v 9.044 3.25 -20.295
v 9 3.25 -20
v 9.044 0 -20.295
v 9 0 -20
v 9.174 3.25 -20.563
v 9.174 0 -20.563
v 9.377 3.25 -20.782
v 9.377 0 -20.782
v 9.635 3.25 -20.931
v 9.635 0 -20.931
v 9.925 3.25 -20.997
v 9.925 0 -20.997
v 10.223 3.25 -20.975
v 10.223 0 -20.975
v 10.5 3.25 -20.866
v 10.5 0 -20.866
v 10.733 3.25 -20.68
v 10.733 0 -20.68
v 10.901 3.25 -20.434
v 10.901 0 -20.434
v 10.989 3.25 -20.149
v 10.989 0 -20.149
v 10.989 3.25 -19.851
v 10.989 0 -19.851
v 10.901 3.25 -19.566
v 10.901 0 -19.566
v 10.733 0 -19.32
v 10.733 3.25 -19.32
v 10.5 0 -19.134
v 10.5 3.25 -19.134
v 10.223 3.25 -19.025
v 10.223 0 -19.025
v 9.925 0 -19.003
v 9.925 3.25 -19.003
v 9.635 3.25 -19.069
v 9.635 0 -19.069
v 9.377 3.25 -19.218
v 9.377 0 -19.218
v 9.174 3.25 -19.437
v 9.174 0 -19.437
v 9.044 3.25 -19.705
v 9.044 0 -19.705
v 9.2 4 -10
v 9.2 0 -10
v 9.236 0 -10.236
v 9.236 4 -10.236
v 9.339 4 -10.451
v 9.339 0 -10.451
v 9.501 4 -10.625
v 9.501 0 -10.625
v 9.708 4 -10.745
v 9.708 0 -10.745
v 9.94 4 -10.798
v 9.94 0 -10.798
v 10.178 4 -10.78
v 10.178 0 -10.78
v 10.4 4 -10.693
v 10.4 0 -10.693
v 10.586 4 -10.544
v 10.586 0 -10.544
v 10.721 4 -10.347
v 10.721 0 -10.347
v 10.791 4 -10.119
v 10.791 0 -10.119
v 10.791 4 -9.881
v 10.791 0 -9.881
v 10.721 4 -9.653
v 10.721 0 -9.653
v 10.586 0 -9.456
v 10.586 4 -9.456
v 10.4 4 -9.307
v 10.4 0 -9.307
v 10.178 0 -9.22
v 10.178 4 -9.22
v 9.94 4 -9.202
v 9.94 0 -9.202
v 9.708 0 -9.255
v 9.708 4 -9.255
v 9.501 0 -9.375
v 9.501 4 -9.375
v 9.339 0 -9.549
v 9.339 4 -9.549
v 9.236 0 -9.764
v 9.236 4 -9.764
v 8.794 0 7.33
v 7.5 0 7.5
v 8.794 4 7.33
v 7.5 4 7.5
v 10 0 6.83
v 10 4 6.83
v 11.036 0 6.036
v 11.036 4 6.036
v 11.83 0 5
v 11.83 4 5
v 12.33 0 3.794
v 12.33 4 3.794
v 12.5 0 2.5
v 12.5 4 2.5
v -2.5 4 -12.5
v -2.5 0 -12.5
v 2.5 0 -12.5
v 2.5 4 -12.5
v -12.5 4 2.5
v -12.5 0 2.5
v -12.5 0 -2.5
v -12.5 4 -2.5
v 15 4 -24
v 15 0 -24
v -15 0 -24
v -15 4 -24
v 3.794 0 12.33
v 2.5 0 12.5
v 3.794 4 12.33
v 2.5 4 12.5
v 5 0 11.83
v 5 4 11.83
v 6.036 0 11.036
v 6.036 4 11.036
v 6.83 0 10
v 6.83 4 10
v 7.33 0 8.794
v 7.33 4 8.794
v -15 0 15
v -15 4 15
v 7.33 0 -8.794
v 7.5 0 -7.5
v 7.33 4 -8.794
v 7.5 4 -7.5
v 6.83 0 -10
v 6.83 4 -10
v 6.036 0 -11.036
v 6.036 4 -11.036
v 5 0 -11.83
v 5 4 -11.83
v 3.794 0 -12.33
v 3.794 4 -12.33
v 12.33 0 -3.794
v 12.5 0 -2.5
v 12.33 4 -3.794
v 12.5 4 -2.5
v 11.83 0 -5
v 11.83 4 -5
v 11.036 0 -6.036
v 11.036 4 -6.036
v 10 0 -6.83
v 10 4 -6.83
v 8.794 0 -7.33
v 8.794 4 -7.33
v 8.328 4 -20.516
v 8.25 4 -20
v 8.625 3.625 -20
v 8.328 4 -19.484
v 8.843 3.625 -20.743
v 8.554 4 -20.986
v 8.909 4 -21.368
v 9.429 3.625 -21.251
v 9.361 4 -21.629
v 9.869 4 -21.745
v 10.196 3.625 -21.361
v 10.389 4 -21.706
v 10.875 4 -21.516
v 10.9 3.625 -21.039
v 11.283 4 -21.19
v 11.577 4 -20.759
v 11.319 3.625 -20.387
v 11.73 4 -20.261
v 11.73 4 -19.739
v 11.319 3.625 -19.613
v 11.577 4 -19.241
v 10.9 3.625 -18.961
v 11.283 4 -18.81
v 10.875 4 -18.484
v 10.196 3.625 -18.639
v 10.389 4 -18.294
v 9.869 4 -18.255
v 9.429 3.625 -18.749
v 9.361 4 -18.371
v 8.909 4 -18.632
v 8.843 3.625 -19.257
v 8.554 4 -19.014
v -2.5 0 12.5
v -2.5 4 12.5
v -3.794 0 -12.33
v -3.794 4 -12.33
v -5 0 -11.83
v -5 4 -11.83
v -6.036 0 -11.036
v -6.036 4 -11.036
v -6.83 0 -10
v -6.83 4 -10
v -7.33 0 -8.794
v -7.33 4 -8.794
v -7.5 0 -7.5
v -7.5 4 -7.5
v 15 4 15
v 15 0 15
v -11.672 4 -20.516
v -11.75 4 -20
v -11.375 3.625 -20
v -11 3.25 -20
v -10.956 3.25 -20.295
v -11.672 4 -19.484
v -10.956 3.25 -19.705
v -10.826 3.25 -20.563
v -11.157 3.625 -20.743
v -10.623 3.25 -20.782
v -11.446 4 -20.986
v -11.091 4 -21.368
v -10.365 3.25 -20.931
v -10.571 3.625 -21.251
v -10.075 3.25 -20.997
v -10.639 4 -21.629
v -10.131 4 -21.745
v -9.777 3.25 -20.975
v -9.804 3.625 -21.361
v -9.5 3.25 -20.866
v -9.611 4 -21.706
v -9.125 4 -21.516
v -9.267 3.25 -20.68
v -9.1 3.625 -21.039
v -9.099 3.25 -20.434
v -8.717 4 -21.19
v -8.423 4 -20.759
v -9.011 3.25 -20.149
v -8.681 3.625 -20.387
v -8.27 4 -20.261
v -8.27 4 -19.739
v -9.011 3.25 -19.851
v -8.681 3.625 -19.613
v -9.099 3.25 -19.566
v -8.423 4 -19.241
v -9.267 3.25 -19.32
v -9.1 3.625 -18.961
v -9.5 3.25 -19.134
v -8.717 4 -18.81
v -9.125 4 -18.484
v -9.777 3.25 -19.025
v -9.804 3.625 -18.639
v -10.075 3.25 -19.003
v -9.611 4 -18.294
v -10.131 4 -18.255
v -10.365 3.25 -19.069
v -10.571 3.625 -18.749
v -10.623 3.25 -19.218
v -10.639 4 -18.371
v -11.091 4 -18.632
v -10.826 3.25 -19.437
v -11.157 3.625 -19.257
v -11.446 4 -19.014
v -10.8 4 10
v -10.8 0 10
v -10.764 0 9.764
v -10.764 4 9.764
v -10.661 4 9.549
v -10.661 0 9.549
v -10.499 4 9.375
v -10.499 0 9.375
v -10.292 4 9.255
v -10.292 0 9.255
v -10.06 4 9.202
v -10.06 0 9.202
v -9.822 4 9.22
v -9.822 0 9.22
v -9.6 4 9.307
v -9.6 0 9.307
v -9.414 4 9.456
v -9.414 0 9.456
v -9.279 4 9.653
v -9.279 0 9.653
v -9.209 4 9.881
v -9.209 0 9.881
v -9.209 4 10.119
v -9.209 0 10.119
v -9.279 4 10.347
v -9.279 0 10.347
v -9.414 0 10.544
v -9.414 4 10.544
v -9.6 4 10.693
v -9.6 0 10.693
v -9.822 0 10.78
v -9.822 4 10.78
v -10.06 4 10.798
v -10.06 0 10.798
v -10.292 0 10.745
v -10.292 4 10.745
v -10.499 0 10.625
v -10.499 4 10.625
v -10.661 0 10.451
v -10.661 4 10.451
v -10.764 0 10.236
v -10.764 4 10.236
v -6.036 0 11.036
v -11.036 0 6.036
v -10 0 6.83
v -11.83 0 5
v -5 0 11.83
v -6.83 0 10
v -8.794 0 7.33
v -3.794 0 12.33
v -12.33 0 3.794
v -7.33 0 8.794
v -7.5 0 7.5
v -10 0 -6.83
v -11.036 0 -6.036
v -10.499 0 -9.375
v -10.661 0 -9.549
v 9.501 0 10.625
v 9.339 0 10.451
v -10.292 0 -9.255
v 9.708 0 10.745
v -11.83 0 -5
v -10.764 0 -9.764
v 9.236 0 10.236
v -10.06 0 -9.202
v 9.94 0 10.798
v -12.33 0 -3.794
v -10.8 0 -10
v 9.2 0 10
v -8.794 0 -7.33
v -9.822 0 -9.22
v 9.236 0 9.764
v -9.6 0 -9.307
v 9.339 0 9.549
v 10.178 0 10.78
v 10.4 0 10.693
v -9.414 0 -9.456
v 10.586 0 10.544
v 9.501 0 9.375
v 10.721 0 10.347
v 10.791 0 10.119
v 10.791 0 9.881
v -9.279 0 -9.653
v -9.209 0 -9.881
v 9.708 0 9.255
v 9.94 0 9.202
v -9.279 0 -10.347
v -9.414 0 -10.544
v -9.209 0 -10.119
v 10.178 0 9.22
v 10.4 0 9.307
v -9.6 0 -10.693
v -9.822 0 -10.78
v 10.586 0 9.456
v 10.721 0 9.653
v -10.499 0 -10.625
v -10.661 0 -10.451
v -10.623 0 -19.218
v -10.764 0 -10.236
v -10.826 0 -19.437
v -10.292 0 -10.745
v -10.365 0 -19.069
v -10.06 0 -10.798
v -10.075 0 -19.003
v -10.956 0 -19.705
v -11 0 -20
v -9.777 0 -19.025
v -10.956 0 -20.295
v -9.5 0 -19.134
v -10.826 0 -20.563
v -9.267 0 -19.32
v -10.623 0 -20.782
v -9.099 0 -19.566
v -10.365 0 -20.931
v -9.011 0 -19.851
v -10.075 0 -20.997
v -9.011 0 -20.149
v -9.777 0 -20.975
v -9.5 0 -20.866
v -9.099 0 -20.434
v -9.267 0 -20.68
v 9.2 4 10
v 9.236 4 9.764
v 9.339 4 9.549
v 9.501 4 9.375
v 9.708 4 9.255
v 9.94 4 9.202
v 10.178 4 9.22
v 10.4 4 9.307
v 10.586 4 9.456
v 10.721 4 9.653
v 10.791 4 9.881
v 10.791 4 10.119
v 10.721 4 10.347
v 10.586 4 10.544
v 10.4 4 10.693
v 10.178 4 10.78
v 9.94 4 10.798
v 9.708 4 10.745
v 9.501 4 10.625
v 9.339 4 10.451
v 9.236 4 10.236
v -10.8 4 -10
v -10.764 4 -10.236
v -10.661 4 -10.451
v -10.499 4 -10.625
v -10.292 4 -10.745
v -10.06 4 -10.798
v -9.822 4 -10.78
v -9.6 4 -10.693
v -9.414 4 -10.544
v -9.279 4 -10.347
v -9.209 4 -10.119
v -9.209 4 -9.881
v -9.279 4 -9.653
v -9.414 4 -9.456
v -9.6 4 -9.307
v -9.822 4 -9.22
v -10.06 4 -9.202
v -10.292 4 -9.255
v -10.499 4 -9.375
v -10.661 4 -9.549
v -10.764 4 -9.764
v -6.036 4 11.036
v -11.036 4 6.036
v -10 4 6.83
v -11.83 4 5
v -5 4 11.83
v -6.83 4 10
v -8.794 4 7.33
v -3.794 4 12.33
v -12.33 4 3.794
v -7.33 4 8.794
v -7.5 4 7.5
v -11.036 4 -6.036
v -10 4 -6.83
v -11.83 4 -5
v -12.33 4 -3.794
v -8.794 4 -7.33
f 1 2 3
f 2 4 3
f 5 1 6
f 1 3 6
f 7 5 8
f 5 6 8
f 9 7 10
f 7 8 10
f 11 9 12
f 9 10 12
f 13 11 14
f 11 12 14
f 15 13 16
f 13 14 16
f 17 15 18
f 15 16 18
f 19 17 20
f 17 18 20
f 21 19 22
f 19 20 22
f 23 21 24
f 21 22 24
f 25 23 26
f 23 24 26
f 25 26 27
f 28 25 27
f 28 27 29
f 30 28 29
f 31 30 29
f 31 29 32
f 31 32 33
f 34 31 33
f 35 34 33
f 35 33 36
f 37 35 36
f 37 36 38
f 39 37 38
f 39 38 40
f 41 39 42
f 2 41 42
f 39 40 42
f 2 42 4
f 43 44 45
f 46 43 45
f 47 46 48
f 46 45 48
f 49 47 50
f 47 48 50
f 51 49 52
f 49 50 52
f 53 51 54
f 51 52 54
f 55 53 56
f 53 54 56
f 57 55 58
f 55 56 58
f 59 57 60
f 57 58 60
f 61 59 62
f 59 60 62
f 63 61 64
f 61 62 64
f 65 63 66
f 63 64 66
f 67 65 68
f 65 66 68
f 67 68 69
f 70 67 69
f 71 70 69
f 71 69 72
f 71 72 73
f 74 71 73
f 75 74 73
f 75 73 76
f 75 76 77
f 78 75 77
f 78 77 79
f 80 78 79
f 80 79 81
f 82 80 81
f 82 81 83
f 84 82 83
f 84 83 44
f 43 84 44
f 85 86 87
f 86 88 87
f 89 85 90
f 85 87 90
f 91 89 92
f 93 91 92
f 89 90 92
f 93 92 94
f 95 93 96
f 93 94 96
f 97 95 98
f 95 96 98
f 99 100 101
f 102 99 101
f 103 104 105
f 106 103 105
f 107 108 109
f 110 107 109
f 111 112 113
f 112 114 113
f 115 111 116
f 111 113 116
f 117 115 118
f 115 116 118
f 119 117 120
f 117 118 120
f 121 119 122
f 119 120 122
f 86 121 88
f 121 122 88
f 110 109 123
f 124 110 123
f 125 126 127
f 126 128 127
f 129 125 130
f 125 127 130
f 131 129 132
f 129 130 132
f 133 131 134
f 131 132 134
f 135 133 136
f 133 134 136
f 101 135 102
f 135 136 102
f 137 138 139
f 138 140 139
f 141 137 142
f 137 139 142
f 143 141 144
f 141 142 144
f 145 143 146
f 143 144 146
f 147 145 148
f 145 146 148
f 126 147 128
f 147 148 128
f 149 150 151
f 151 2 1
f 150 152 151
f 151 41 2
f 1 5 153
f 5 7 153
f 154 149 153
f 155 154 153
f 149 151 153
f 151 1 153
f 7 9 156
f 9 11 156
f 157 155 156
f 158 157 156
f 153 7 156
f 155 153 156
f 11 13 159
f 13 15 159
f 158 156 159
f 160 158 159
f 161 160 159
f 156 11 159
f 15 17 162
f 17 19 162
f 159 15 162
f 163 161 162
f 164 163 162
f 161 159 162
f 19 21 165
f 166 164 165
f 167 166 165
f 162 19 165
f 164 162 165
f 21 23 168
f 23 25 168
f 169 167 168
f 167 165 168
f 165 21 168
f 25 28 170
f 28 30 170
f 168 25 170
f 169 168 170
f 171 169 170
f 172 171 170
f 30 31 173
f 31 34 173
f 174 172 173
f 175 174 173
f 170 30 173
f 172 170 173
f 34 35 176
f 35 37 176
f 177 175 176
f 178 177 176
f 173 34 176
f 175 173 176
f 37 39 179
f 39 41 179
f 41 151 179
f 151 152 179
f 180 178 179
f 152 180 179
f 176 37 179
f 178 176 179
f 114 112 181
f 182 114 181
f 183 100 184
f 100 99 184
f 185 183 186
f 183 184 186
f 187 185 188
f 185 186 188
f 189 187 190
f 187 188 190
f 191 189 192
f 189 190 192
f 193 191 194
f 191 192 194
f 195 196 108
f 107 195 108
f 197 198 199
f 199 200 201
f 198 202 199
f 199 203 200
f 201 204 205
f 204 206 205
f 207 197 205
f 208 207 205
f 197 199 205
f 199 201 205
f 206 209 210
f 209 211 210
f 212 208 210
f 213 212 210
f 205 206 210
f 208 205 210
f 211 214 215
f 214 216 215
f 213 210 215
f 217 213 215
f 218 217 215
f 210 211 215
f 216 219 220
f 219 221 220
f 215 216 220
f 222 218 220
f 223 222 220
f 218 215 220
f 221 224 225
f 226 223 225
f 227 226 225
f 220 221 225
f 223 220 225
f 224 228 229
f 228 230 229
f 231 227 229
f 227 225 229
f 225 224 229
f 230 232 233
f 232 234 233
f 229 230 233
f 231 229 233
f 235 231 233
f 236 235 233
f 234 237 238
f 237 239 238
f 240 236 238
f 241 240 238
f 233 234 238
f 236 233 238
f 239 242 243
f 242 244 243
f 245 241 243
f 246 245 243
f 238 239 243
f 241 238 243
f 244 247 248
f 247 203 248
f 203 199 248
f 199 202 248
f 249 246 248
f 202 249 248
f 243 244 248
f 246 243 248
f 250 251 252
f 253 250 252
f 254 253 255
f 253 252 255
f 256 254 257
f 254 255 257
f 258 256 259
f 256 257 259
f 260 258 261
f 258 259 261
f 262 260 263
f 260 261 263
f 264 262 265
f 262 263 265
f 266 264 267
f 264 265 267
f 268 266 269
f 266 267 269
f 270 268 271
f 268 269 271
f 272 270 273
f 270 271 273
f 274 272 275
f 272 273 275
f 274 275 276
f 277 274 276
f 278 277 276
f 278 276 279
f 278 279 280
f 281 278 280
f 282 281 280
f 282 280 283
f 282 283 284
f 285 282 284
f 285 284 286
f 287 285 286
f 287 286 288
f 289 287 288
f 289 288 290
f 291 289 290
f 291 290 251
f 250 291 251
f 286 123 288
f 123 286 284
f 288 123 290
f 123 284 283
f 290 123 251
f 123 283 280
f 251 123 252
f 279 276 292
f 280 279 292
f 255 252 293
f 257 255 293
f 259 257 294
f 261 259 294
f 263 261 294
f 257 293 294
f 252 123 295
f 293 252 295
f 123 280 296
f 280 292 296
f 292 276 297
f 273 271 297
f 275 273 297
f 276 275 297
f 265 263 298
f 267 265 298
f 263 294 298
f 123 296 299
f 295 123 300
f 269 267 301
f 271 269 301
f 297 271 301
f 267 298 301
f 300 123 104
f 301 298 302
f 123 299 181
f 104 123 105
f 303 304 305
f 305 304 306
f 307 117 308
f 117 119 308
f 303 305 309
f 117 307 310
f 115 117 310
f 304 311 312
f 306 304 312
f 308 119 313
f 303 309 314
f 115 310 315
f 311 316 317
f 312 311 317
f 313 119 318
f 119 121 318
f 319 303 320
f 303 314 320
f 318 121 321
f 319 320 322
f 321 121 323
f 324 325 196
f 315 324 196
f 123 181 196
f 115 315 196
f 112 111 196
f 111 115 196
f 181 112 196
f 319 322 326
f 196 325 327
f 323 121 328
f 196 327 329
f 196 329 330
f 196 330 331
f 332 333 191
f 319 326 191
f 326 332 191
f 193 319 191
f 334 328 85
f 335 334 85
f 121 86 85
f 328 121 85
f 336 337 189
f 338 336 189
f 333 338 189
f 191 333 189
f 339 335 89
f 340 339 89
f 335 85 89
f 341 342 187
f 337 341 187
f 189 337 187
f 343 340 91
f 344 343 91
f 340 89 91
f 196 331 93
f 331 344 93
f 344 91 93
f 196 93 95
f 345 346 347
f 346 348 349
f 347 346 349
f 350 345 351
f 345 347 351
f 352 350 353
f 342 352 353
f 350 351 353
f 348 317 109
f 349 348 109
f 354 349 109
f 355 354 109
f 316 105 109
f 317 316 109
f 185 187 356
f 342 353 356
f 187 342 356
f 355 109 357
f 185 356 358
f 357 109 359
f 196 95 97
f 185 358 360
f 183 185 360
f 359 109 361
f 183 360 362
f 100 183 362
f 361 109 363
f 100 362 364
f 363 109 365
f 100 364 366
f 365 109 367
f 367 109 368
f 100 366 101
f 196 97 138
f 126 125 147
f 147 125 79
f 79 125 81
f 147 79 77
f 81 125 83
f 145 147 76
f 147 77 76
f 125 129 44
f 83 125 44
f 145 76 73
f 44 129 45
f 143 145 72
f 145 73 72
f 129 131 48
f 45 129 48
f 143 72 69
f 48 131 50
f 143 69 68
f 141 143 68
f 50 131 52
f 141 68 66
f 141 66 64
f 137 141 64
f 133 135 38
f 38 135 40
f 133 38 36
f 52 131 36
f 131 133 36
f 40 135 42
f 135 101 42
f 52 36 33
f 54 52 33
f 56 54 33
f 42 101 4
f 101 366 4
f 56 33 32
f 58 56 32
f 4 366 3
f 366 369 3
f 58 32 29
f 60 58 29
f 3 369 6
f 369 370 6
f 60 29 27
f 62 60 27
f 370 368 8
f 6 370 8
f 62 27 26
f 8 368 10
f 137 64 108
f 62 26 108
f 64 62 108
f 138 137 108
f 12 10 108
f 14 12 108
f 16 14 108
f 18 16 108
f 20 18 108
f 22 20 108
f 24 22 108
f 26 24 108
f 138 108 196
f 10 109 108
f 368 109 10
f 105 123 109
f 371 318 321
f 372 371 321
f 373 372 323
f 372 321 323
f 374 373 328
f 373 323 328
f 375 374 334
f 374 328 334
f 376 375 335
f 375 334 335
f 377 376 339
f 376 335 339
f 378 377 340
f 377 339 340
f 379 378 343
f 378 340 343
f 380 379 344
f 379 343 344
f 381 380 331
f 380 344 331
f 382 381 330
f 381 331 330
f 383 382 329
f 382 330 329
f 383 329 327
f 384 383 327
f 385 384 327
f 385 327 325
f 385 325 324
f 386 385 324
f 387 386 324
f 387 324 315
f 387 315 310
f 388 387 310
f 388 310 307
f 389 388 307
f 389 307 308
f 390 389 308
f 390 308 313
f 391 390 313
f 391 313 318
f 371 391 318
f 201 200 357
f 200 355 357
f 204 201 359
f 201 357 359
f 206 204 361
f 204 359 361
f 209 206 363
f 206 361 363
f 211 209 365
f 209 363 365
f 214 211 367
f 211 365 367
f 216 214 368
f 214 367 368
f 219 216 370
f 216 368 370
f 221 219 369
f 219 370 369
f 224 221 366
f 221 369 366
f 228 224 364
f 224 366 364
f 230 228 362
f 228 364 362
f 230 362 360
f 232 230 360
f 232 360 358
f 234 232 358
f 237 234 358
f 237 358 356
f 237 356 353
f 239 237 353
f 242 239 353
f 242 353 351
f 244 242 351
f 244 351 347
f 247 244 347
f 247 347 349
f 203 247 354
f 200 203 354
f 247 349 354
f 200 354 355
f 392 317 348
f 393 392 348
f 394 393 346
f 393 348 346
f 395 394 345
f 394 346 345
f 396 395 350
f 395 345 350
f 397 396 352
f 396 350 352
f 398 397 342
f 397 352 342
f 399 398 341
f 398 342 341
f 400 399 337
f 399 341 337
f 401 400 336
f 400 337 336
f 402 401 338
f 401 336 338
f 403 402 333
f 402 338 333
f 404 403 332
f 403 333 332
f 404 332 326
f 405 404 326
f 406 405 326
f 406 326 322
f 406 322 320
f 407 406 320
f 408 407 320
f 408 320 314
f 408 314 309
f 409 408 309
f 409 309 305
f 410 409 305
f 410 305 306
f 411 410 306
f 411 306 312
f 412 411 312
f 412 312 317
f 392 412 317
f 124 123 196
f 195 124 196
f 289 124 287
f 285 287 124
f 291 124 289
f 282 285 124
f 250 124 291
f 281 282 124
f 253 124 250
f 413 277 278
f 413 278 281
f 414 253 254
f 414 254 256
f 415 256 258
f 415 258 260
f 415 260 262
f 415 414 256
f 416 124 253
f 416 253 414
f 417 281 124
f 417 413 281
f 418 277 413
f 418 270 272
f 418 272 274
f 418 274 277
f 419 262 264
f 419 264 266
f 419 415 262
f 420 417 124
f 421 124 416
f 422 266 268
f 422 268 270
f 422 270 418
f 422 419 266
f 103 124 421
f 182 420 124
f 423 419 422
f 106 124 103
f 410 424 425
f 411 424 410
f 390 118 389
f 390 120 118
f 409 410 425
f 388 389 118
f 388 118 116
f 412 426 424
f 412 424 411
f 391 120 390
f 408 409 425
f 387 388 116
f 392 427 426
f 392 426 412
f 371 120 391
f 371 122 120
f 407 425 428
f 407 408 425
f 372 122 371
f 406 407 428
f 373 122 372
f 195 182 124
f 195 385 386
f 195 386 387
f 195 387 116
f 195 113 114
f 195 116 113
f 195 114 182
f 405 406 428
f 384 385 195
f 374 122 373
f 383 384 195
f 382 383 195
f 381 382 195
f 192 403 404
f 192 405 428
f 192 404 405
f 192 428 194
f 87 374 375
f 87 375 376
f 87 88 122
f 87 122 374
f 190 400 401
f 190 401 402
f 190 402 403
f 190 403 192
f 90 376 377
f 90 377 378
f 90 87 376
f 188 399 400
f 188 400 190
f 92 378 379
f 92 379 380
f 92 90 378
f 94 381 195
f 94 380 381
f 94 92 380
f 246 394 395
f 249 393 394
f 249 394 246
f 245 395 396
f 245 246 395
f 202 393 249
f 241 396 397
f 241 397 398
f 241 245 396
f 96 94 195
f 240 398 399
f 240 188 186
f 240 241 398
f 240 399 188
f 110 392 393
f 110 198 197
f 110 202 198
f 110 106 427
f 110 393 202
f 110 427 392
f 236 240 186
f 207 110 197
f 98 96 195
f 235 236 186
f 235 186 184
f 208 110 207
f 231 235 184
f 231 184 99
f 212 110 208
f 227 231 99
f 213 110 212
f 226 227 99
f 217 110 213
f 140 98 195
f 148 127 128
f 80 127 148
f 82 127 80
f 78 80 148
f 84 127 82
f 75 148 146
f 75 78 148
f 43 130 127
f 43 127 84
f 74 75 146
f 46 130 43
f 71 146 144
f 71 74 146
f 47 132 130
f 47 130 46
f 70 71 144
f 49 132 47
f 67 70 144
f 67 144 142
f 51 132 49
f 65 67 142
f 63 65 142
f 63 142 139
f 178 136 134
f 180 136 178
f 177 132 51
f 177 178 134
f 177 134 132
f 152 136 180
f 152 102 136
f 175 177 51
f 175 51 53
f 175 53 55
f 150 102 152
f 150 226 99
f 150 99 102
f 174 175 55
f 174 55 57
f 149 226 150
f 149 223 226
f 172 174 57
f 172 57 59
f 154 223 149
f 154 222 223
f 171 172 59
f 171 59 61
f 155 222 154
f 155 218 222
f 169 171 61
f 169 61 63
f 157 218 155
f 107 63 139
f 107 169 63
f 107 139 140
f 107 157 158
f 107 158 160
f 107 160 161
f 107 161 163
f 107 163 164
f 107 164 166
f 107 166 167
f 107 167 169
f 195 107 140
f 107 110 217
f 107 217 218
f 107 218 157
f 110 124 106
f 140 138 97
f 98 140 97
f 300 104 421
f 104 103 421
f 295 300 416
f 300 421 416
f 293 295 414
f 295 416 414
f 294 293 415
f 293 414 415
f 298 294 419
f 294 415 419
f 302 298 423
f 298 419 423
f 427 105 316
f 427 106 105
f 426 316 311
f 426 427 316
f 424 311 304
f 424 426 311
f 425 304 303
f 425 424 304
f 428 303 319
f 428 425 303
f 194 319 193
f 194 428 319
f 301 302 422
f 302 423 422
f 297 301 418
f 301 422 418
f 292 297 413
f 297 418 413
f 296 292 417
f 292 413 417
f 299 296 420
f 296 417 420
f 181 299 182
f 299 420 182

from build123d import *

# Parameters (mm, degrees)
AUFSATZ_LINEAR_AUSTRAGEN1_DEPTH                      = 4
VERRUNDUNG1_R                                        = 5
FORMSENKUNG_F_R_M3_SENKSCHRAUBE_MIT_INNE_D           = 2
FORMSENKUNG_F_R_M3_SENKSCHRAUBE_MIT_INNE_CSINK_D     = 3.5
FORMSENKUNG_F_R_M3_SENKSCHRAUBE_MIT_INNE_CSINK_ANGLE = 90
M2_GEWINDEBOHRUNG1_D                                 = 1.6


with BuildPart() as part:
    # Skizze1 → Aufsatz-Linear austragen1 (new body)
    with BuildSketch(Plane(origin=(0, 0, 0), x_dir=(1, 0, 0), z_dir=(0, 1, 0))):
        Polygon((-15, 15), (-15, -15), (15, -15), (15, 15), (15, 24), (-15, 24), align=None)
        Polygon((-12.5, 7.5), (-7.5, 7.5), (-7.5, 12.5), (7.5, 12.5), (7.5, 7.5), (12.5, 7.5), (12.5, -7.5), (7.5, -7.5), (7.5, -12.5), (-7.5, -12.5), (-7.5, -7.5), (-12.5, -7.5), align=None, mode=Mode.SUBTRACT)
    extrude(amount=AUFSATZ_LINEAR_AUSTRAGEN1_DEPTH)

    # Verrundung1
    verrundung1_edges = [part.edges().sort_by_distance(p)[0] for p in [
        (-7.5, 2, 12.5),
        (-12.5, 2, 7.5),
        (12.5, 2, 7.5),
        (7.5, 2, 12.5),
        (12.5, 2, -7.5),
        (7.5, 2, -12.5),
        (-7.5, 2, -12.5),
        (-12.5, 2, -7.5),
    ]]
    fillet(verrundung1_edges, radius=VERRUNDUNG1_R - 0.0001)  # a hair under: the kernel refuses the full size

    # Formsenkung für M3 Senkschraube mit Innensechskant1 (through all)
    with Locations(Plane(origin=(0, 4, 0), x_dir=(1, 0, 0), z_dir=(0, 1, 0))):
        with Locations((-10, 20), (10, 20)):
            CounterSinkHole(FORMSENKUNG_F_R_M3_SENKSCHRAUBE_MIT_INNE_D / 2, FORMSENKUNG_F_R_M3_SENKSCHRAUBE_MIT_INNE_CSINK_D / 2, counter_sink_angle=FORMSENKUNG_F_R_M3_SENKSCHRAUBE_MIT_INNE_CSINK_ANGLE)

    # M2 Gewindebohrung1 (through all)
    with Locations(Plane(origin=(0, 4, 0), x_dir=(1, 0, 0), z_dir=(0, 1, 0))):
        with Locations((-10, 10), (10, 10), (10, -10), (-10, -10)):
            Hole(M2_GEWINDEBOHRUNG1_D / 2)


solid = part.part
